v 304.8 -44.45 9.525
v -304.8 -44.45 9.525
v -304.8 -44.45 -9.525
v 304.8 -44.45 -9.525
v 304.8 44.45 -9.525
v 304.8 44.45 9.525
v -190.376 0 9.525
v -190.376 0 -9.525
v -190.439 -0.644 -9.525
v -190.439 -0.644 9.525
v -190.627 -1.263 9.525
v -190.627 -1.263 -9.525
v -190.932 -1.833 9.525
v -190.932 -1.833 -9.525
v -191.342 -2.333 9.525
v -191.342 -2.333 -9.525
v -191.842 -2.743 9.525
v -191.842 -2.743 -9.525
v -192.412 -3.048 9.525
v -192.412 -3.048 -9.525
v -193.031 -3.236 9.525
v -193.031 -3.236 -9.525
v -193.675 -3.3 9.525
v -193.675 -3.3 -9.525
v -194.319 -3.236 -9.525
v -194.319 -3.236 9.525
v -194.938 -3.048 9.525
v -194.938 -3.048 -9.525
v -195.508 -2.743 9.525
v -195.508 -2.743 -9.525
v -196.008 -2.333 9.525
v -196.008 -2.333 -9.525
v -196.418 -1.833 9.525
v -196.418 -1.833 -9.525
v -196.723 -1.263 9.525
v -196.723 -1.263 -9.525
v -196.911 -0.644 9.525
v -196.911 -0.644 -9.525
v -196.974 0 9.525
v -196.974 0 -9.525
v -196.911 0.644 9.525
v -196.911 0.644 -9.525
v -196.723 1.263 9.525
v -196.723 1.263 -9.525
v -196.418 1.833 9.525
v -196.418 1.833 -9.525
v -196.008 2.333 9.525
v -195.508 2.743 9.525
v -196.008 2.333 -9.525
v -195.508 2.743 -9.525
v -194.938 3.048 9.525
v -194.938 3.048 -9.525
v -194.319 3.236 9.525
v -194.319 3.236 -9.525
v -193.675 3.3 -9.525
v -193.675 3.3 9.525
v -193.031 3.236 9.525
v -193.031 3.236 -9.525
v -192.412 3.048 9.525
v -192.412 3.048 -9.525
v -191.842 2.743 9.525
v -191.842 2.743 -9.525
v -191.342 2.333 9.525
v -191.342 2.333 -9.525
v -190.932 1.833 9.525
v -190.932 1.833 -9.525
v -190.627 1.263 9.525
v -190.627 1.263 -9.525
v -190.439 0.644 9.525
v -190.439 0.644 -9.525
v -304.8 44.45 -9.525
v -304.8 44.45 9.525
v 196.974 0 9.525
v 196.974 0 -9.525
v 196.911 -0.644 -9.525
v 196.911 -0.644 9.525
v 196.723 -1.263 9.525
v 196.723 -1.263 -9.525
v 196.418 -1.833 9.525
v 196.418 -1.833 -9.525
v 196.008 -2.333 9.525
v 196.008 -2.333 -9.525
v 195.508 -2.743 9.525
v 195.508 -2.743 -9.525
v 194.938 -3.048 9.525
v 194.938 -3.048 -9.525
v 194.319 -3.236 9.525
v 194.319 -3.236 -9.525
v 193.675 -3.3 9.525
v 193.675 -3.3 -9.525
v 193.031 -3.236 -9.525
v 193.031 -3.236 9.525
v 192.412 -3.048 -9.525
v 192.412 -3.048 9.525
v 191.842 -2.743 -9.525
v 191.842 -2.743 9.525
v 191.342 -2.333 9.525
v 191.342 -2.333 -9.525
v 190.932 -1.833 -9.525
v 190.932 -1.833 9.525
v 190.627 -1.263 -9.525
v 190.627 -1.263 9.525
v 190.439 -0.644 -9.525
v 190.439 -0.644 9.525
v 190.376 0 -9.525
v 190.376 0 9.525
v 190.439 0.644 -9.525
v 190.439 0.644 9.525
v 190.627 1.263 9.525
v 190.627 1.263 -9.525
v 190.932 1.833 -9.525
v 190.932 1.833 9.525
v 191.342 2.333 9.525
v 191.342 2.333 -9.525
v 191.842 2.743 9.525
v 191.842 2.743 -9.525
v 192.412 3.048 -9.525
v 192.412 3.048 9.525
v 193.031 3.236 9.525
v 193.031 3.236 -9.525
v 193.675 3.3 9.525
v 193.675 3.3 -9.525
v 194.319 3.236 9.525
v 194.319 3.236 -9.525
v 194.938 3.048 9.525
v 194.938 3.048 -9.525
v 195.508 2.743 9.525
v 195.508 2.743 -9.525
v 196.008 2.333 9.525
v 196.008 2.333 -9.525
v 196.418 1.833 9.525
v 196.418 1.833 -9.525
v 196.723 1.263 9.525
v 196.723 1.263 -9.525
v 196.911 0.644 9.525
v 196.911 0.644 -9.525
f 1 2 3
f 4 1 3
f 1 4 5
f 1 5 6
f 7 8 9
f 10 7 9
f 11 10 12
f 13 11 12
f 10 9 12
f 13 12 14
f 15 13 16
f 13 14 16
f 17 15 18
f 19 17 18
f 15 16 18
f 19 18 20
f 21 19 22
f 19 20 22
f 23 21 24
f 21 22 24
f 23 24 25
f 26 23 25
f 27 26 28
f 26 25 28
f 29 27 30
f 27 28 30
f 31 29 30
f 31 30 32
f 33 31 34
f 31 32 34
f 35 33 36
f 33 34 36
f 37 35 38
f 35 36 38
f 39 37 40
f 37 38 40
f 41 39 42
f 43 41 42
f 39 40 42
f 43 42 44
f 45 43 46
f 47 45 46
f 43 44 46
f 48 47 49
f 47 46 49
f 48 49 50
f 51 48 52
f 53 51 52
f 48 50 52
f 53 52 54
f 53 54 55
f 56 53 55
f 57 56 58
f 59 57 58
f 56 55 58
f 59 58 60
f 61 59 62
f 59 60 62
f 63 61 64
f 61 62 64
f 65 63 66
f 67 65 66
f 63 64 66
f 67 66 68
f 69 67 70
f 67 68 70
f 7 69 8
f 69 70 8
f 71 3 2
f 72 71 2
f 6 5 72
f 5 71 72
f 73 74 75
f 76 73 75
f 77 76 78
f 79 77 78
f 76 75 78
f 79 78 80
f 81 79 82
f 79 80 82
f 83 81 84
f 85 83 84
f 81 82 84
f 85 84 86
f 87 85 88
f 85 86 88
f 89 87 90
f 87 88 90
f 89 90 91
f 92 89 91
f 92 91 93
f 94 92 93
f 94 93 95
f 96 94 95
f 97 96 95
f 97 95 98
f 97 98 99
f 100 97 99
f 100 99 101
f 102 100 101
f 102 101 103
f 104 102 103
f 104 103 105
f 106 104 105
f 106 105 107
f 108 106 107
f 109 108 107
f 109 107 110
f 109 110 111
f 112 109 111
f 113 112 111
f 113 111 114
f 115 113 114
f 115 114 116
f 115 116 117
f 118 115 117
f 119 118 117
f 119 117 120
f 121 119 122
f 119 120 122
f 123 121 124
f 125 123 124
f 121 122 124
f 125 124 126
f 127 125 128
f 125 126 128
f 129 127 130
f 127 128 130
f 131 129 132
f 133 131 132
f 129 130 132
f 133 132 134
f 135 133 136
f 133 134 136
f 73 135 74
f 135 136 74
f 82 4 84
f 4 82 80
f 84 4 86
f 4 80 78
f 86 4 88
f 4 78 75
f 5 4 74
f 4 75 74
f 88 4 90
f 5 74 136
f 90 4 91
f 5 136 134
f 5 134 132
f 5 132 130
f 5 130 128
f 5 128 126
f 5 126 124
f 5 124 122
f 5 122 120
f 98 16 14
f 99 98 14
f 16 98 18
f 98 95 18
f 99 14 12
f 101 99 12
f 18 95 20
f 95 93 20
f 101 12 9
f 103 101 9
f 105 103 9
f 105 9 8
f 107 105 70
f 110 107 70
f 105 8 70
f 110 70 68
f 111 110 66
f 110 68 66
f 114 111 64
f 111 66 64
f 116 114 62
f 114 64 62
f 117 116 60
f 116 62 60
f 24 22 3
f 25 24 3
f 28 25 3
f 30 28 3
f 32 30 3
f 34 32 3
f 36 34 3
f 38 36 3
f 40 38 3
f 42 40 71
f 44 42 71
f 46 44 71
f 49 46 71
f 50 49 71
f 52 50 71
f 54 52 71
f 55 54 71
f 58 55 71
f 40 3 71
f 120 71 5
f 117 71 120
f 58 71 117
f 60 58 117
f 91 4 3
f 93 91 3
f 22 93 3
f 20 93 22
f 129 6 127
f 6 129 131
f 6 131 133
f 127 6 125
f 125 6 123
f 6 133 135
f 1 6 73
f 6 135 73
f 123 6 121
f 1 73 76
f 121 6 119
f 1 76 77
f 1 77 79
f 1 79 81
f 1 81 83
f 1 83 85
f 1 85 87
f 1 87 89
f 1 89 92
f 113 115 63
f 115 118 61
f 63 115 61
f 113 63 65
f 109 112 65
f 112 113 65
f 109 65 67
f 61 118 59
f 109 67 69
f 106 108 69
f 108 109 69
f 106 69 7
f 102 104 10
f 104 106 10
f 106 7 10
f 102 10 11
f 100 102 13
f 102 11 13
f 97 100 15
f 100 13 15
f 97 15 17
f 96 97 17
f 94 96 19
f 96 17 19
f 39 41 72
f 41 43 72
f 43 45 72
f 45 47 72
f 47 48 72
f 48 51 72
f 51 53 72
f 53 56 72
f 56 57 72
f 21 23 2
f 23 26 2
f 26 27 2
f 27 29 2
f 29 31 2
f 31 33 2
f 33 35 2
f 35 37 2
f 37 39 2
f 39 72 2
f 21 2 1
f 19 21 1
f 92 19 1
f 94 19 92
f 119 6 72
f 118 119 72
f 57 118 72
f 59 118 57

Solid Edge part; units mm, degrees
sketch "Sketch1" plane through (0, 0, 0) normal (1, 0, 0) x (0, 1, 0)
  line L0 (-44.45, -9.525) -> (44.45, -9.525)
  line L1 (44.45, -9.525) -> (44.45, 9.525)
  line L2 (44.45, 9.525) -> (-44.45, 9.525)
  line L3 (-44.45, 9.525) -> (-44.45, -9.525)
  dimension "D1" = 88.9
  dimension "D2" = 19.05
extrude "Protrusion1" add sketch "Sketch1" along normal mid plane 609.6
sketch "Sketch2" plane through (0, 0, -9.525) normal (0, 0, -1) x (1, 0, 0)
  circle A0 centre (193.675, 0) radius 3.2995
  circle A1 centre (-193.675, 0) radius 3.2995
  dimension "D1" = 6.5989
  dimension "D2" = 111.125
  dimension "D3" = 498.475
extrude "Cutout1" cut sketch "Sketch2" against normal through all
properties material "Wood, Pine"
